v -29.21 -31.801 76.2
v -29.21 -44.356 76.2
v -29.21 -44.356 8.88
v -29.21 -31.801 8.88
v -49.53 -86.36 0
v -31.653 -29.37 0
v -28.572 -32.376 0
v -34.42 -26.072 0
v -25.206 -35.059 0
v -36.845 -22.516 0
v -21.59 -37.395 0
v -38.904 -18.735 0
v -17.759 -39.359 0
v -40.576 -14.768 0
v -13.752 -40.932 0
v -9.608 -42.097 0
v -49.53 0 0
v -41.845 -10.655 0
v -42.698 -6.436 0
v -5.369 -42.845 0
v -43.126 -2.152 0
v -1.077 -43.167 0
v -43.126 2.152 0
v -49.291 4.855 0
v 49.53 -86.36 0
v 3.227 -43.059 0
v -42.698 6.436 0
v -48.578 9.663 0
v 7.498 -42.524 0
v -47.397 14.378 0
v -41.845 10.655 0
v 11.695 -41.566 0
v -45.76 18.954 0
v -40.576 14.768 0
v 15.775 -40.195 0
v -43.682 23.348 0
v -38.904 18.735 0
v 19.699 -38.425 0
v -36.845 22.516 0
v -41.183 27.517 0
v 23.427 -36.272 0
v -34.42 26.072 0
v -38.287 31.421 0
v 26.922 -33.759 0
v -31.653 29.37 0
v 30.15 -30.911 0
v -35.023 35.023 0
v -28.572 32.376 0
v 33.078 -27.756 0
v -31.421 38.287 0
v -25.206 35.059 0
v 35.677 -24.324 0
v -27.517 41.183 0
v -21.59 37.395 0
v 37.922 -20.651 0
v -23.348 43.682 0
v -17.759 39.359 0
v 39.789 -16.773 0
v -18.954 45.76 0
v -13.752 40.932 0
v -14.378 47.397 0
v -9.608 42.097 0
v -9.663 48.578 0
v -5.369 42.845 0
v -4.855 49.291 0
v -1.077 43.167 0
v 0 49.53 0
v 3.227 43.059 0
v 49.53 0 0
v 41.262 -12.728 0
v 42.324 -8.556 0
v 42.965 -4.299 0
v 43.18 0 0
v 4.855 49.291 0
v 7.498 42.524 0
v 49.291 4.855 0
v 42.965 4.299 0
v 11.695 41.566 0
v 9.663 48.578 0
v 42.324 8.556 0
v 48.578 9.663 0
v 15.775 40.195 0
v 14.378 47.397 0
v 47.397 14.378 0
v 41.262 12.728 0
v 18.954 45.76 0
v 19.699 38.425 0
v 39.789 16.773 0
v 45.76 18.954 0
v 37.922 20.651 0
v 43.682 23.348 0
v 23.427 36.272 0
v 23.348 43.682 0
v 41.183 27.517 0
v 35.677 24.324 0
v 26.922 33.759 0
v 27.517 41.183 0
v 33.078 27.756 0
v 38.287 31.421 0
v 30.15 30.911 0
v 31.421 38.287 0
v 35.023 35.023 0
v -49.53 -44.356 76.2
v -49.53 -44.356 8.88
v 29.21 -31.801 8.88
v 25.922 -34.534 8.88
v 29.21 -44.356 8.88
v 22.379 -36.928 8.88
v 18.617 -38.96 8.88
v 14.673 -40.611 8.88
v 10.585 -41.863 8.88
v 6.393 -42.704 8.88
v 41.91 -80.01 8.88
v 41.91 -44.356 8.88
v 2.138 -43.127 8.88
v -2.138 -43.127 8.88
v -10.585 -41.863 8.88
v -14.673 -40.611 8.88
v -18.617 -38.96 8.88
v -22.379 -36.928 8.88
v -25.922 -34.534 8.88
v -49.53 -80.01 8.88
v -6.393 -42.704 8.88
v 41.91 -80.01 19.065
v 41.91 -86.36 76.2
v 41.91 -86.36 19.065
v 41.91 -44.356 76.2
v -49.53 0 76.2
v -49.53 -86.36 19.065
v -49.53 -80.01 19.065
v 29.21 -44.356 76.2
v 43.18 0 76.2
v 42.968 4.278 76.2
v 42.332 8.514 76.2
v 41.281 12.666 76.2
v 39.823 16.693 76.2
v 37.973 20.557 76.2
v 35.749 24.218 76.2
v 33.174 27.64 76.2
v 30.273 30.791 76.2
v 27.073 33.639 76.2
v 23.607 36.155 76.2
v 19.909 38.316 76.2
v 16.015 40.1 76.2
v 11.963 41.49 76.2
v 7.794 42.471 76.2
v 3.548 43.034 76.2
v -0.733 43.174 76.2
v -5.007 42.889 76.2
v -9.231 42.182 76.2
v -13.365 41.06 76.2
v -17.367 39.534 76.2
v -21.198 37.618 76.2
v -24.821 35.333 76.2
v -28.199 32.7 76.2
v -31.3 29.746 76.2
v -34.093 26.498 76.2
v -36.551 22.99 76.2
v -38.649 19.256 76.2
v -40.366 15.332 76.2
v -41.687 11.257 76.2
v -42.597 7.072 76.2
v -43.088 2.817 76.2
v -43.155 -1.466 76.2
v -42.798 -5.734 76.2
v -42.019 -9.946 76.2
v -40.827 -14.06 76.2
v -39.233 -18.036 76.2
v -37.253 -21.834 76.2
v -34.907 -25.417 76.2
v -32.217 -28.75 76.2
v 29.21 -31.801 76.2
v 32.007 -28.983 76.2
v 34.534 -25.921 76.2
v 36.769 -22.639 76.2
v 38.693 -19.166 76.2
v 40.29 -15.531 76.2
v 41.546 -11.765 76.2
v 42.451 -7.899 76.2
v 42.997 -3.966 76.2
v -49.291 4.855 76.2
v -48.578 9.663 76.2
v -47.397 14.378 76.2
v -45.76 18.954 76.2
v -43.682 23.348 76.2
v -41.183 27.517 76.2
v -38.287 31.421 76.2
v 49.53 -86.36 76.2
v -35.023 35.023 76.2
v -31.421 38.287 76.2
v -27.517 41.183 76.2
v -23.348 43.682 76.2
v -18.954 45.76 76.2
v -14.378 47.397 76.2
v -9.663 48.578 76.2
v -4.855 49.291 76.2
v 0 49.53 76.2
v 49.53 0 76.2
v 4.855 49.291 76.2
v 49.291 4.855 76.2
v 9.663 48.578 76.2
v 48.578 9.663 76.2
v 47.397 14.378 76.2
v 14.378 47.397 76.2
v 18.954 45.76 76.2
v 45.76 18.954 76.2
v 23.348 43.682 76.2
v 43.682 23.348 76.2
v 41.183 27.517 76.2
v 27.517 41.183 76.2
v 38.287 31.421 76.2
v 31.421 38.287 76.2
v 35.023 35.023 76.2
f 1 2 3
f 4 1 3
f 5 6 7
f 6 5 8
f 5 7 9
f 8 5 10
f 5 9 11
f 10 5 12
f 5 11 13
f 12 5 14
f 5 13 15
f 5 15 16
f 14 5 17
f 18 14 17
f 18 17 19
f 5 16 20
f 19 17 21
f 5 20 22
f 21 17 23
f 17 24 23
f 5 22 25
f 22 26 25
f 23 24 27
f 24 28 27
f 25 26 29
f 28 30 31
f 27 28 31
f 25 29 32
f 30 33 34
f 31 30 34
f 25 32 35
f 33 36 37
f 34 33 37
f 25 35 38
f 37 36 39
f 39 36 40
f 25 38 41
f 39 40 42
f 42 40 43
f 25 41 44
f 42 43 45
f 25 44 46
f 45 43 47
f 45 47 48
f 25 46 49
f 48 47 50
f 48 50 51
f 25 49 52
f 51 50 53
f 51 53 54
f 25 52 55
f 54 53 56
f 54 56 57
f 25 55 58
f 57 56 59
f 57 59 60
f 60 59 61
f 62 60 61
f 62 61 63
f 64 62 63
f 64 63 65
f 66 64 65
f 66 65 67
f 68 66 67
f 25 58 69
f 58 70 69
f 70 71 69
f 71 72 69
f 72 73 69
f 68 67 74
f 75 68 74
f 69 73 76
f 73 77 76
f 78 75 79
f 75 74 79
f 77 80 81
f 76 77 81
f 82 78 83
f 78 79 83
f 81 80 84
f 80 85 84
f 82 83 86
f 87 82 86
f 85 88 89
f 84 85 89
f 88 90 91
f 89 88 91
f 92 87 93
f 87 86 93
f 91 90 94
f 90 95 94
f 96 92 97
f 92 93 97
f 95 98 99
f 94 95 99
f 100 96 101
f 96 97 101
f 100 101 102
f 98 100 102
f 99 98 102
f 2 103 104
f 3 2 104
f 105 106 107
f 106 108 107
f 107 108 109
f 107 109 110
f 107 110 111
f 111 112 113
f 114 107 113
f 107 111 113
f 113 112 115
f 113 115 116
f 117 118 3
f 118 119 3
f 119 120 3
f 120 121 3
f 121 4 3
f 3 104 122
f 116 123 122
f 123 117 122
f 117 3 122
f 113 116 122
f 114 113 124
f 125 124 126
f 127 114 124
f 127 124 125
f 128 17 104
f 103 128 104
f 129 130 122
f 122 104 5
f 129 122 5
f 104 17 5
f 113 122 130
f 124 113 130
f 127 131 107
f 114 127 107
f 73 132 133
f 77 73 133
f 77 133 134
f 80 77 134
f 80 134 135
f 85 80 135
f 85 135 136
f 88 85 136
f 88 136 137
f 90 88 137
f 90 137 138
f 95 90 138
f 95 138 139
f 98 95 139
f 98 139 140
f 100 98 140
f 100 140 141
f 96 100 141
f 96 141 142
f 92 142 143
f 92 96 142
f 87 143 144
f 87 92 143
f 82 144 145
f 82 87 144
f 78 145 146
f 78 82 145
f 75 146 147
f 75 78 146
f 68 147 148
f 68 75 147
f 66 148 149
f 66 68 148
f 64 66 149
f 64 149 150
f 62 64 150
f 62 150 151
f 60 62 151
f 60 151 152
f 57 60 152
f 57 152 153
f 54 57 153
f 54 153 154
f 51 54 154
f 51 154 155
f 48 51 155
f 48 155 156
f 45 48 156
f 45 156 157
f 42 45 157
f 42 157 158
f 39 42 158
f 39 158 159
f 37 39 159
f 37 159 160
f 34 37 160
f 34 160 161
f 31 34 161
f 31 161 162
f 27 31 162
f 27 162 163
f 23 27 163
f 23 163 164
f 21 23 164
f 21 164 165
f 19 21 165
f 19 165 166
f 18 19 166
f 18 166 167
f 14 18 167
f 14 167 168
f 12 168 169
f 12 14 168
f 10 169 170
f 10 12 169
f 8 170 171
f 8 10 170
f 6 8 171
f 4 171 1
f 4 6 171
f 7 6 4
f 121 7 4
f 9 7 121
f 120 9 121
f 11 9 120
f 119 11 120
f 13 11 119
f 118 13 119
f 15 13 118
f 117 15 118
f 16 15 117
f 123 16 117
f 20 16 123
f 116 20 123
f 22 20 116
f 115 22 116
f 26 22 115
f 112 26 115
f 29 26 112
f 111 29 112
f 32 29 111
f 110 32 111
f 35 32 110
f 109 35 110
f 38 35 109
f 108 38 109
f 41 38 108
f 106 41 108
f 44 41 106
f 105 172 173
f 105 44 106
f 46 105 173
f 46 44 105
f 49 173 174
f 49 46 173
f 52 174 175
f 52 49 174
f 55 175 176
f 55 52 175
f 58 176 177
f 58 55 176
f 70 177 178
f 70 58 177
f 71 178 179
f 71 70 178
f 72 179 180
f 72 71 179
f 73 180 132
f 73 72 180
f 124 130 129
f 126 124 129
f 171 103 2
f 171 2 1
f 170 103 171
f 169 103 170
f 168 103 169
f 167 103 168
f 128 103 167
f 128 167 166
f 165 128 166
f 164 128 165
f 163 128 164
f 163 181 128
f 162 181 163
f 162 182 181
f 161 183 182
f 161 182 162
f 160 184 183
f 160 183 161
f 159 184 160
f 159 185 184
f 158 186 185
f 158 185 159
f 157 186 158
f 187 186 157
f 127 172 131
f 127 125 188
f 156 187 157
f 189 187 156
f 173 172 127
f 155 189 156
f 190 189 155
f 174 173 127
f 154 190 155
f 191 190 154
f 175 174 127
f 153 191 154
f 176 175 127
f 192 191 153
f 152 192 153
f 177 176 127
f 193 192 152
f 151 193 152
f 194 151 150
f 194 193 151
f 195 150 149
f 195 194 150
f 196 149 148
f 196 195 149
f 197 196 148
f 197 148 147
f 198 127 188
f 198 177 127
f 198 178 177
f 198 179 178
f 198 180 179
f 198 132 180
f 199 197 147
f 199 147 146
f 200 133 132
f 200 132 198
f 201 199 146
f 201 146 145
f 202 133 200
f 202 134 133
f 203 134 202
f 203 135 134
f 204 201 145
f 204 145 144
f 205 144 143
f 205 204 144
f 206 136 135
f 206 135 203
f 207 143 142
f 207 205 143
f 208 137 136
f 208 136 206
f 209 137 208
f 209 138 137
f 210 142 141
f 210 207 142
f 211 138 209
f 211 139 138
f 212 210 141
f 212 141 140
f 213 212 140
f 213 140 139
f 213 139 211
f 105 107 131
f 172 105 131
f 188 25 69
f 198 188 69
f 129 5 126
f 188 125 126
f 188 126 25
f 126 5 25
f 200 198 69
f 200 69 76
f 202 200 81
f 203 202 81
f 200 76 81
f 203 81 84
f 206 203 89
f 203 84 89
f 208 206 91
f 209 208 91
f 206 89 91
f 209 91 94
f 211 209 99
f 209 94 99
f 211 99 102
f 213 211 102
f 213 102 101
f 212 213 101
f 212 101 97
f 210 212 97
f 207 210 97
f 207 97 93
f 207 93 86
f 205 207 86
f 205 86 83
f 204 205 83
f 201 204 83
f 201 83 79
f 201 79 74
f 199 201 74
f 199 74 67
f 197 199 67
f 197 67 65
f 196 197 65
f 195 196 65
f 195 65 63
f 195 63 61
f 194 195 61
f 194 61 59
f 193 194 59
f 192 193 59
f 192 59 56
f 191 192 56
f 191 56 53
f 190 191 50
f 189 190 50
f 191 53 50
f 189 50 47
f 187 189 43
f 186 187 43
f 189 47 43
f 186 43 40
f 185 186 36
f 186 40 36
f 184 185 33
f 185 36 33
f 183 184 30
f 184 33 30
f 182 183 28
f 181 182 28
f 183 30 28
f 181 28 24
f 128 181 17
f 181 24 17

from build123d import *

# Parameters (mm, degrees)
SKETCH1_R               = 49.53
SKETCH1_R_2             = 43.18
BOSS_EXTRUDE1_DEPTH     = 76.2
BOSS_EXTRUDE2_DEPTH     = 76.2
CUT_EXTRUDE4_DEPTH      = 91.44
CUT_EXTRUDE5_DEPTH      = 20.066
CUT_EXTRUDE5_DEPTH_BACK = 23.622


with BuildPart() as part:
    # Sketch1 → Boss-Extrude1 (new body)
    with BuildSketch(Plane.XY):
        Circle(SKETCH1_R)
        Circle(SKETCH1_R_2, mode=Mode.SUBTRACT)
    extrude(amount=BOSS_EXTRUDE1_DEPTH)

    # Sketch2 → Boss-Extrude2 (add)
    with BuildSketch(Plane.XY):
        with BuildLine():
            ThreePointArc((49.53, 0), (0, -49.53), (-49.53, 0))
            Line((-49.53, 0), (-49.53, -49.53))
            Line((-49.53, -49.53), (-49.53, -86.36))
            Line((-49.53, -86.36), (0, -86.36))
            Line((0, -86.36), (49.53, -86.36))
            Line((49.53, -86.36), (49.53, 0))
        make_face()
    extrude(amount=BOSS_EXTRUDE2_DEPTH)

    # Sketch3 → Cut-Extrude4 (cut)
    with BuildSketch(Plane.ZY.offset(49.53)):
        Polygon((19.065134697, -80.01), (19.065134697, -86.36), (31.768891325, -86.36), (76.2, -86.36), (76.2, -44.356391486), (8.879845192, -44.356391486), (8.879845192, -80.01), align=None)
    extrude(amount=-CUT_EXTRUDE4_DEPTH, mode=Mode.SUBTRACT)

    # Sketch6 → Cut-Extrude5 (cut, two sides)
    with BuildSketch(Plane.XZ.offset(44.356391486)) as cut_extrude5_sk:
        Polygon((0, 76.2), (-29.21, 76.2), (-29.21, 8.879845192), (29.21, 8.879845192), (29.21, 76.2), align=None)
    extrude(amount=CUT_EXTRUDE5_DEPTH, mode=Mode.SUBTRACT)
    extrude(cut_extrude5_sk.sketch, amount=-CUT_EXTRUDE5_DEPTH_BACK, mode=Mode.SUBTRACT)


solid = part.part
